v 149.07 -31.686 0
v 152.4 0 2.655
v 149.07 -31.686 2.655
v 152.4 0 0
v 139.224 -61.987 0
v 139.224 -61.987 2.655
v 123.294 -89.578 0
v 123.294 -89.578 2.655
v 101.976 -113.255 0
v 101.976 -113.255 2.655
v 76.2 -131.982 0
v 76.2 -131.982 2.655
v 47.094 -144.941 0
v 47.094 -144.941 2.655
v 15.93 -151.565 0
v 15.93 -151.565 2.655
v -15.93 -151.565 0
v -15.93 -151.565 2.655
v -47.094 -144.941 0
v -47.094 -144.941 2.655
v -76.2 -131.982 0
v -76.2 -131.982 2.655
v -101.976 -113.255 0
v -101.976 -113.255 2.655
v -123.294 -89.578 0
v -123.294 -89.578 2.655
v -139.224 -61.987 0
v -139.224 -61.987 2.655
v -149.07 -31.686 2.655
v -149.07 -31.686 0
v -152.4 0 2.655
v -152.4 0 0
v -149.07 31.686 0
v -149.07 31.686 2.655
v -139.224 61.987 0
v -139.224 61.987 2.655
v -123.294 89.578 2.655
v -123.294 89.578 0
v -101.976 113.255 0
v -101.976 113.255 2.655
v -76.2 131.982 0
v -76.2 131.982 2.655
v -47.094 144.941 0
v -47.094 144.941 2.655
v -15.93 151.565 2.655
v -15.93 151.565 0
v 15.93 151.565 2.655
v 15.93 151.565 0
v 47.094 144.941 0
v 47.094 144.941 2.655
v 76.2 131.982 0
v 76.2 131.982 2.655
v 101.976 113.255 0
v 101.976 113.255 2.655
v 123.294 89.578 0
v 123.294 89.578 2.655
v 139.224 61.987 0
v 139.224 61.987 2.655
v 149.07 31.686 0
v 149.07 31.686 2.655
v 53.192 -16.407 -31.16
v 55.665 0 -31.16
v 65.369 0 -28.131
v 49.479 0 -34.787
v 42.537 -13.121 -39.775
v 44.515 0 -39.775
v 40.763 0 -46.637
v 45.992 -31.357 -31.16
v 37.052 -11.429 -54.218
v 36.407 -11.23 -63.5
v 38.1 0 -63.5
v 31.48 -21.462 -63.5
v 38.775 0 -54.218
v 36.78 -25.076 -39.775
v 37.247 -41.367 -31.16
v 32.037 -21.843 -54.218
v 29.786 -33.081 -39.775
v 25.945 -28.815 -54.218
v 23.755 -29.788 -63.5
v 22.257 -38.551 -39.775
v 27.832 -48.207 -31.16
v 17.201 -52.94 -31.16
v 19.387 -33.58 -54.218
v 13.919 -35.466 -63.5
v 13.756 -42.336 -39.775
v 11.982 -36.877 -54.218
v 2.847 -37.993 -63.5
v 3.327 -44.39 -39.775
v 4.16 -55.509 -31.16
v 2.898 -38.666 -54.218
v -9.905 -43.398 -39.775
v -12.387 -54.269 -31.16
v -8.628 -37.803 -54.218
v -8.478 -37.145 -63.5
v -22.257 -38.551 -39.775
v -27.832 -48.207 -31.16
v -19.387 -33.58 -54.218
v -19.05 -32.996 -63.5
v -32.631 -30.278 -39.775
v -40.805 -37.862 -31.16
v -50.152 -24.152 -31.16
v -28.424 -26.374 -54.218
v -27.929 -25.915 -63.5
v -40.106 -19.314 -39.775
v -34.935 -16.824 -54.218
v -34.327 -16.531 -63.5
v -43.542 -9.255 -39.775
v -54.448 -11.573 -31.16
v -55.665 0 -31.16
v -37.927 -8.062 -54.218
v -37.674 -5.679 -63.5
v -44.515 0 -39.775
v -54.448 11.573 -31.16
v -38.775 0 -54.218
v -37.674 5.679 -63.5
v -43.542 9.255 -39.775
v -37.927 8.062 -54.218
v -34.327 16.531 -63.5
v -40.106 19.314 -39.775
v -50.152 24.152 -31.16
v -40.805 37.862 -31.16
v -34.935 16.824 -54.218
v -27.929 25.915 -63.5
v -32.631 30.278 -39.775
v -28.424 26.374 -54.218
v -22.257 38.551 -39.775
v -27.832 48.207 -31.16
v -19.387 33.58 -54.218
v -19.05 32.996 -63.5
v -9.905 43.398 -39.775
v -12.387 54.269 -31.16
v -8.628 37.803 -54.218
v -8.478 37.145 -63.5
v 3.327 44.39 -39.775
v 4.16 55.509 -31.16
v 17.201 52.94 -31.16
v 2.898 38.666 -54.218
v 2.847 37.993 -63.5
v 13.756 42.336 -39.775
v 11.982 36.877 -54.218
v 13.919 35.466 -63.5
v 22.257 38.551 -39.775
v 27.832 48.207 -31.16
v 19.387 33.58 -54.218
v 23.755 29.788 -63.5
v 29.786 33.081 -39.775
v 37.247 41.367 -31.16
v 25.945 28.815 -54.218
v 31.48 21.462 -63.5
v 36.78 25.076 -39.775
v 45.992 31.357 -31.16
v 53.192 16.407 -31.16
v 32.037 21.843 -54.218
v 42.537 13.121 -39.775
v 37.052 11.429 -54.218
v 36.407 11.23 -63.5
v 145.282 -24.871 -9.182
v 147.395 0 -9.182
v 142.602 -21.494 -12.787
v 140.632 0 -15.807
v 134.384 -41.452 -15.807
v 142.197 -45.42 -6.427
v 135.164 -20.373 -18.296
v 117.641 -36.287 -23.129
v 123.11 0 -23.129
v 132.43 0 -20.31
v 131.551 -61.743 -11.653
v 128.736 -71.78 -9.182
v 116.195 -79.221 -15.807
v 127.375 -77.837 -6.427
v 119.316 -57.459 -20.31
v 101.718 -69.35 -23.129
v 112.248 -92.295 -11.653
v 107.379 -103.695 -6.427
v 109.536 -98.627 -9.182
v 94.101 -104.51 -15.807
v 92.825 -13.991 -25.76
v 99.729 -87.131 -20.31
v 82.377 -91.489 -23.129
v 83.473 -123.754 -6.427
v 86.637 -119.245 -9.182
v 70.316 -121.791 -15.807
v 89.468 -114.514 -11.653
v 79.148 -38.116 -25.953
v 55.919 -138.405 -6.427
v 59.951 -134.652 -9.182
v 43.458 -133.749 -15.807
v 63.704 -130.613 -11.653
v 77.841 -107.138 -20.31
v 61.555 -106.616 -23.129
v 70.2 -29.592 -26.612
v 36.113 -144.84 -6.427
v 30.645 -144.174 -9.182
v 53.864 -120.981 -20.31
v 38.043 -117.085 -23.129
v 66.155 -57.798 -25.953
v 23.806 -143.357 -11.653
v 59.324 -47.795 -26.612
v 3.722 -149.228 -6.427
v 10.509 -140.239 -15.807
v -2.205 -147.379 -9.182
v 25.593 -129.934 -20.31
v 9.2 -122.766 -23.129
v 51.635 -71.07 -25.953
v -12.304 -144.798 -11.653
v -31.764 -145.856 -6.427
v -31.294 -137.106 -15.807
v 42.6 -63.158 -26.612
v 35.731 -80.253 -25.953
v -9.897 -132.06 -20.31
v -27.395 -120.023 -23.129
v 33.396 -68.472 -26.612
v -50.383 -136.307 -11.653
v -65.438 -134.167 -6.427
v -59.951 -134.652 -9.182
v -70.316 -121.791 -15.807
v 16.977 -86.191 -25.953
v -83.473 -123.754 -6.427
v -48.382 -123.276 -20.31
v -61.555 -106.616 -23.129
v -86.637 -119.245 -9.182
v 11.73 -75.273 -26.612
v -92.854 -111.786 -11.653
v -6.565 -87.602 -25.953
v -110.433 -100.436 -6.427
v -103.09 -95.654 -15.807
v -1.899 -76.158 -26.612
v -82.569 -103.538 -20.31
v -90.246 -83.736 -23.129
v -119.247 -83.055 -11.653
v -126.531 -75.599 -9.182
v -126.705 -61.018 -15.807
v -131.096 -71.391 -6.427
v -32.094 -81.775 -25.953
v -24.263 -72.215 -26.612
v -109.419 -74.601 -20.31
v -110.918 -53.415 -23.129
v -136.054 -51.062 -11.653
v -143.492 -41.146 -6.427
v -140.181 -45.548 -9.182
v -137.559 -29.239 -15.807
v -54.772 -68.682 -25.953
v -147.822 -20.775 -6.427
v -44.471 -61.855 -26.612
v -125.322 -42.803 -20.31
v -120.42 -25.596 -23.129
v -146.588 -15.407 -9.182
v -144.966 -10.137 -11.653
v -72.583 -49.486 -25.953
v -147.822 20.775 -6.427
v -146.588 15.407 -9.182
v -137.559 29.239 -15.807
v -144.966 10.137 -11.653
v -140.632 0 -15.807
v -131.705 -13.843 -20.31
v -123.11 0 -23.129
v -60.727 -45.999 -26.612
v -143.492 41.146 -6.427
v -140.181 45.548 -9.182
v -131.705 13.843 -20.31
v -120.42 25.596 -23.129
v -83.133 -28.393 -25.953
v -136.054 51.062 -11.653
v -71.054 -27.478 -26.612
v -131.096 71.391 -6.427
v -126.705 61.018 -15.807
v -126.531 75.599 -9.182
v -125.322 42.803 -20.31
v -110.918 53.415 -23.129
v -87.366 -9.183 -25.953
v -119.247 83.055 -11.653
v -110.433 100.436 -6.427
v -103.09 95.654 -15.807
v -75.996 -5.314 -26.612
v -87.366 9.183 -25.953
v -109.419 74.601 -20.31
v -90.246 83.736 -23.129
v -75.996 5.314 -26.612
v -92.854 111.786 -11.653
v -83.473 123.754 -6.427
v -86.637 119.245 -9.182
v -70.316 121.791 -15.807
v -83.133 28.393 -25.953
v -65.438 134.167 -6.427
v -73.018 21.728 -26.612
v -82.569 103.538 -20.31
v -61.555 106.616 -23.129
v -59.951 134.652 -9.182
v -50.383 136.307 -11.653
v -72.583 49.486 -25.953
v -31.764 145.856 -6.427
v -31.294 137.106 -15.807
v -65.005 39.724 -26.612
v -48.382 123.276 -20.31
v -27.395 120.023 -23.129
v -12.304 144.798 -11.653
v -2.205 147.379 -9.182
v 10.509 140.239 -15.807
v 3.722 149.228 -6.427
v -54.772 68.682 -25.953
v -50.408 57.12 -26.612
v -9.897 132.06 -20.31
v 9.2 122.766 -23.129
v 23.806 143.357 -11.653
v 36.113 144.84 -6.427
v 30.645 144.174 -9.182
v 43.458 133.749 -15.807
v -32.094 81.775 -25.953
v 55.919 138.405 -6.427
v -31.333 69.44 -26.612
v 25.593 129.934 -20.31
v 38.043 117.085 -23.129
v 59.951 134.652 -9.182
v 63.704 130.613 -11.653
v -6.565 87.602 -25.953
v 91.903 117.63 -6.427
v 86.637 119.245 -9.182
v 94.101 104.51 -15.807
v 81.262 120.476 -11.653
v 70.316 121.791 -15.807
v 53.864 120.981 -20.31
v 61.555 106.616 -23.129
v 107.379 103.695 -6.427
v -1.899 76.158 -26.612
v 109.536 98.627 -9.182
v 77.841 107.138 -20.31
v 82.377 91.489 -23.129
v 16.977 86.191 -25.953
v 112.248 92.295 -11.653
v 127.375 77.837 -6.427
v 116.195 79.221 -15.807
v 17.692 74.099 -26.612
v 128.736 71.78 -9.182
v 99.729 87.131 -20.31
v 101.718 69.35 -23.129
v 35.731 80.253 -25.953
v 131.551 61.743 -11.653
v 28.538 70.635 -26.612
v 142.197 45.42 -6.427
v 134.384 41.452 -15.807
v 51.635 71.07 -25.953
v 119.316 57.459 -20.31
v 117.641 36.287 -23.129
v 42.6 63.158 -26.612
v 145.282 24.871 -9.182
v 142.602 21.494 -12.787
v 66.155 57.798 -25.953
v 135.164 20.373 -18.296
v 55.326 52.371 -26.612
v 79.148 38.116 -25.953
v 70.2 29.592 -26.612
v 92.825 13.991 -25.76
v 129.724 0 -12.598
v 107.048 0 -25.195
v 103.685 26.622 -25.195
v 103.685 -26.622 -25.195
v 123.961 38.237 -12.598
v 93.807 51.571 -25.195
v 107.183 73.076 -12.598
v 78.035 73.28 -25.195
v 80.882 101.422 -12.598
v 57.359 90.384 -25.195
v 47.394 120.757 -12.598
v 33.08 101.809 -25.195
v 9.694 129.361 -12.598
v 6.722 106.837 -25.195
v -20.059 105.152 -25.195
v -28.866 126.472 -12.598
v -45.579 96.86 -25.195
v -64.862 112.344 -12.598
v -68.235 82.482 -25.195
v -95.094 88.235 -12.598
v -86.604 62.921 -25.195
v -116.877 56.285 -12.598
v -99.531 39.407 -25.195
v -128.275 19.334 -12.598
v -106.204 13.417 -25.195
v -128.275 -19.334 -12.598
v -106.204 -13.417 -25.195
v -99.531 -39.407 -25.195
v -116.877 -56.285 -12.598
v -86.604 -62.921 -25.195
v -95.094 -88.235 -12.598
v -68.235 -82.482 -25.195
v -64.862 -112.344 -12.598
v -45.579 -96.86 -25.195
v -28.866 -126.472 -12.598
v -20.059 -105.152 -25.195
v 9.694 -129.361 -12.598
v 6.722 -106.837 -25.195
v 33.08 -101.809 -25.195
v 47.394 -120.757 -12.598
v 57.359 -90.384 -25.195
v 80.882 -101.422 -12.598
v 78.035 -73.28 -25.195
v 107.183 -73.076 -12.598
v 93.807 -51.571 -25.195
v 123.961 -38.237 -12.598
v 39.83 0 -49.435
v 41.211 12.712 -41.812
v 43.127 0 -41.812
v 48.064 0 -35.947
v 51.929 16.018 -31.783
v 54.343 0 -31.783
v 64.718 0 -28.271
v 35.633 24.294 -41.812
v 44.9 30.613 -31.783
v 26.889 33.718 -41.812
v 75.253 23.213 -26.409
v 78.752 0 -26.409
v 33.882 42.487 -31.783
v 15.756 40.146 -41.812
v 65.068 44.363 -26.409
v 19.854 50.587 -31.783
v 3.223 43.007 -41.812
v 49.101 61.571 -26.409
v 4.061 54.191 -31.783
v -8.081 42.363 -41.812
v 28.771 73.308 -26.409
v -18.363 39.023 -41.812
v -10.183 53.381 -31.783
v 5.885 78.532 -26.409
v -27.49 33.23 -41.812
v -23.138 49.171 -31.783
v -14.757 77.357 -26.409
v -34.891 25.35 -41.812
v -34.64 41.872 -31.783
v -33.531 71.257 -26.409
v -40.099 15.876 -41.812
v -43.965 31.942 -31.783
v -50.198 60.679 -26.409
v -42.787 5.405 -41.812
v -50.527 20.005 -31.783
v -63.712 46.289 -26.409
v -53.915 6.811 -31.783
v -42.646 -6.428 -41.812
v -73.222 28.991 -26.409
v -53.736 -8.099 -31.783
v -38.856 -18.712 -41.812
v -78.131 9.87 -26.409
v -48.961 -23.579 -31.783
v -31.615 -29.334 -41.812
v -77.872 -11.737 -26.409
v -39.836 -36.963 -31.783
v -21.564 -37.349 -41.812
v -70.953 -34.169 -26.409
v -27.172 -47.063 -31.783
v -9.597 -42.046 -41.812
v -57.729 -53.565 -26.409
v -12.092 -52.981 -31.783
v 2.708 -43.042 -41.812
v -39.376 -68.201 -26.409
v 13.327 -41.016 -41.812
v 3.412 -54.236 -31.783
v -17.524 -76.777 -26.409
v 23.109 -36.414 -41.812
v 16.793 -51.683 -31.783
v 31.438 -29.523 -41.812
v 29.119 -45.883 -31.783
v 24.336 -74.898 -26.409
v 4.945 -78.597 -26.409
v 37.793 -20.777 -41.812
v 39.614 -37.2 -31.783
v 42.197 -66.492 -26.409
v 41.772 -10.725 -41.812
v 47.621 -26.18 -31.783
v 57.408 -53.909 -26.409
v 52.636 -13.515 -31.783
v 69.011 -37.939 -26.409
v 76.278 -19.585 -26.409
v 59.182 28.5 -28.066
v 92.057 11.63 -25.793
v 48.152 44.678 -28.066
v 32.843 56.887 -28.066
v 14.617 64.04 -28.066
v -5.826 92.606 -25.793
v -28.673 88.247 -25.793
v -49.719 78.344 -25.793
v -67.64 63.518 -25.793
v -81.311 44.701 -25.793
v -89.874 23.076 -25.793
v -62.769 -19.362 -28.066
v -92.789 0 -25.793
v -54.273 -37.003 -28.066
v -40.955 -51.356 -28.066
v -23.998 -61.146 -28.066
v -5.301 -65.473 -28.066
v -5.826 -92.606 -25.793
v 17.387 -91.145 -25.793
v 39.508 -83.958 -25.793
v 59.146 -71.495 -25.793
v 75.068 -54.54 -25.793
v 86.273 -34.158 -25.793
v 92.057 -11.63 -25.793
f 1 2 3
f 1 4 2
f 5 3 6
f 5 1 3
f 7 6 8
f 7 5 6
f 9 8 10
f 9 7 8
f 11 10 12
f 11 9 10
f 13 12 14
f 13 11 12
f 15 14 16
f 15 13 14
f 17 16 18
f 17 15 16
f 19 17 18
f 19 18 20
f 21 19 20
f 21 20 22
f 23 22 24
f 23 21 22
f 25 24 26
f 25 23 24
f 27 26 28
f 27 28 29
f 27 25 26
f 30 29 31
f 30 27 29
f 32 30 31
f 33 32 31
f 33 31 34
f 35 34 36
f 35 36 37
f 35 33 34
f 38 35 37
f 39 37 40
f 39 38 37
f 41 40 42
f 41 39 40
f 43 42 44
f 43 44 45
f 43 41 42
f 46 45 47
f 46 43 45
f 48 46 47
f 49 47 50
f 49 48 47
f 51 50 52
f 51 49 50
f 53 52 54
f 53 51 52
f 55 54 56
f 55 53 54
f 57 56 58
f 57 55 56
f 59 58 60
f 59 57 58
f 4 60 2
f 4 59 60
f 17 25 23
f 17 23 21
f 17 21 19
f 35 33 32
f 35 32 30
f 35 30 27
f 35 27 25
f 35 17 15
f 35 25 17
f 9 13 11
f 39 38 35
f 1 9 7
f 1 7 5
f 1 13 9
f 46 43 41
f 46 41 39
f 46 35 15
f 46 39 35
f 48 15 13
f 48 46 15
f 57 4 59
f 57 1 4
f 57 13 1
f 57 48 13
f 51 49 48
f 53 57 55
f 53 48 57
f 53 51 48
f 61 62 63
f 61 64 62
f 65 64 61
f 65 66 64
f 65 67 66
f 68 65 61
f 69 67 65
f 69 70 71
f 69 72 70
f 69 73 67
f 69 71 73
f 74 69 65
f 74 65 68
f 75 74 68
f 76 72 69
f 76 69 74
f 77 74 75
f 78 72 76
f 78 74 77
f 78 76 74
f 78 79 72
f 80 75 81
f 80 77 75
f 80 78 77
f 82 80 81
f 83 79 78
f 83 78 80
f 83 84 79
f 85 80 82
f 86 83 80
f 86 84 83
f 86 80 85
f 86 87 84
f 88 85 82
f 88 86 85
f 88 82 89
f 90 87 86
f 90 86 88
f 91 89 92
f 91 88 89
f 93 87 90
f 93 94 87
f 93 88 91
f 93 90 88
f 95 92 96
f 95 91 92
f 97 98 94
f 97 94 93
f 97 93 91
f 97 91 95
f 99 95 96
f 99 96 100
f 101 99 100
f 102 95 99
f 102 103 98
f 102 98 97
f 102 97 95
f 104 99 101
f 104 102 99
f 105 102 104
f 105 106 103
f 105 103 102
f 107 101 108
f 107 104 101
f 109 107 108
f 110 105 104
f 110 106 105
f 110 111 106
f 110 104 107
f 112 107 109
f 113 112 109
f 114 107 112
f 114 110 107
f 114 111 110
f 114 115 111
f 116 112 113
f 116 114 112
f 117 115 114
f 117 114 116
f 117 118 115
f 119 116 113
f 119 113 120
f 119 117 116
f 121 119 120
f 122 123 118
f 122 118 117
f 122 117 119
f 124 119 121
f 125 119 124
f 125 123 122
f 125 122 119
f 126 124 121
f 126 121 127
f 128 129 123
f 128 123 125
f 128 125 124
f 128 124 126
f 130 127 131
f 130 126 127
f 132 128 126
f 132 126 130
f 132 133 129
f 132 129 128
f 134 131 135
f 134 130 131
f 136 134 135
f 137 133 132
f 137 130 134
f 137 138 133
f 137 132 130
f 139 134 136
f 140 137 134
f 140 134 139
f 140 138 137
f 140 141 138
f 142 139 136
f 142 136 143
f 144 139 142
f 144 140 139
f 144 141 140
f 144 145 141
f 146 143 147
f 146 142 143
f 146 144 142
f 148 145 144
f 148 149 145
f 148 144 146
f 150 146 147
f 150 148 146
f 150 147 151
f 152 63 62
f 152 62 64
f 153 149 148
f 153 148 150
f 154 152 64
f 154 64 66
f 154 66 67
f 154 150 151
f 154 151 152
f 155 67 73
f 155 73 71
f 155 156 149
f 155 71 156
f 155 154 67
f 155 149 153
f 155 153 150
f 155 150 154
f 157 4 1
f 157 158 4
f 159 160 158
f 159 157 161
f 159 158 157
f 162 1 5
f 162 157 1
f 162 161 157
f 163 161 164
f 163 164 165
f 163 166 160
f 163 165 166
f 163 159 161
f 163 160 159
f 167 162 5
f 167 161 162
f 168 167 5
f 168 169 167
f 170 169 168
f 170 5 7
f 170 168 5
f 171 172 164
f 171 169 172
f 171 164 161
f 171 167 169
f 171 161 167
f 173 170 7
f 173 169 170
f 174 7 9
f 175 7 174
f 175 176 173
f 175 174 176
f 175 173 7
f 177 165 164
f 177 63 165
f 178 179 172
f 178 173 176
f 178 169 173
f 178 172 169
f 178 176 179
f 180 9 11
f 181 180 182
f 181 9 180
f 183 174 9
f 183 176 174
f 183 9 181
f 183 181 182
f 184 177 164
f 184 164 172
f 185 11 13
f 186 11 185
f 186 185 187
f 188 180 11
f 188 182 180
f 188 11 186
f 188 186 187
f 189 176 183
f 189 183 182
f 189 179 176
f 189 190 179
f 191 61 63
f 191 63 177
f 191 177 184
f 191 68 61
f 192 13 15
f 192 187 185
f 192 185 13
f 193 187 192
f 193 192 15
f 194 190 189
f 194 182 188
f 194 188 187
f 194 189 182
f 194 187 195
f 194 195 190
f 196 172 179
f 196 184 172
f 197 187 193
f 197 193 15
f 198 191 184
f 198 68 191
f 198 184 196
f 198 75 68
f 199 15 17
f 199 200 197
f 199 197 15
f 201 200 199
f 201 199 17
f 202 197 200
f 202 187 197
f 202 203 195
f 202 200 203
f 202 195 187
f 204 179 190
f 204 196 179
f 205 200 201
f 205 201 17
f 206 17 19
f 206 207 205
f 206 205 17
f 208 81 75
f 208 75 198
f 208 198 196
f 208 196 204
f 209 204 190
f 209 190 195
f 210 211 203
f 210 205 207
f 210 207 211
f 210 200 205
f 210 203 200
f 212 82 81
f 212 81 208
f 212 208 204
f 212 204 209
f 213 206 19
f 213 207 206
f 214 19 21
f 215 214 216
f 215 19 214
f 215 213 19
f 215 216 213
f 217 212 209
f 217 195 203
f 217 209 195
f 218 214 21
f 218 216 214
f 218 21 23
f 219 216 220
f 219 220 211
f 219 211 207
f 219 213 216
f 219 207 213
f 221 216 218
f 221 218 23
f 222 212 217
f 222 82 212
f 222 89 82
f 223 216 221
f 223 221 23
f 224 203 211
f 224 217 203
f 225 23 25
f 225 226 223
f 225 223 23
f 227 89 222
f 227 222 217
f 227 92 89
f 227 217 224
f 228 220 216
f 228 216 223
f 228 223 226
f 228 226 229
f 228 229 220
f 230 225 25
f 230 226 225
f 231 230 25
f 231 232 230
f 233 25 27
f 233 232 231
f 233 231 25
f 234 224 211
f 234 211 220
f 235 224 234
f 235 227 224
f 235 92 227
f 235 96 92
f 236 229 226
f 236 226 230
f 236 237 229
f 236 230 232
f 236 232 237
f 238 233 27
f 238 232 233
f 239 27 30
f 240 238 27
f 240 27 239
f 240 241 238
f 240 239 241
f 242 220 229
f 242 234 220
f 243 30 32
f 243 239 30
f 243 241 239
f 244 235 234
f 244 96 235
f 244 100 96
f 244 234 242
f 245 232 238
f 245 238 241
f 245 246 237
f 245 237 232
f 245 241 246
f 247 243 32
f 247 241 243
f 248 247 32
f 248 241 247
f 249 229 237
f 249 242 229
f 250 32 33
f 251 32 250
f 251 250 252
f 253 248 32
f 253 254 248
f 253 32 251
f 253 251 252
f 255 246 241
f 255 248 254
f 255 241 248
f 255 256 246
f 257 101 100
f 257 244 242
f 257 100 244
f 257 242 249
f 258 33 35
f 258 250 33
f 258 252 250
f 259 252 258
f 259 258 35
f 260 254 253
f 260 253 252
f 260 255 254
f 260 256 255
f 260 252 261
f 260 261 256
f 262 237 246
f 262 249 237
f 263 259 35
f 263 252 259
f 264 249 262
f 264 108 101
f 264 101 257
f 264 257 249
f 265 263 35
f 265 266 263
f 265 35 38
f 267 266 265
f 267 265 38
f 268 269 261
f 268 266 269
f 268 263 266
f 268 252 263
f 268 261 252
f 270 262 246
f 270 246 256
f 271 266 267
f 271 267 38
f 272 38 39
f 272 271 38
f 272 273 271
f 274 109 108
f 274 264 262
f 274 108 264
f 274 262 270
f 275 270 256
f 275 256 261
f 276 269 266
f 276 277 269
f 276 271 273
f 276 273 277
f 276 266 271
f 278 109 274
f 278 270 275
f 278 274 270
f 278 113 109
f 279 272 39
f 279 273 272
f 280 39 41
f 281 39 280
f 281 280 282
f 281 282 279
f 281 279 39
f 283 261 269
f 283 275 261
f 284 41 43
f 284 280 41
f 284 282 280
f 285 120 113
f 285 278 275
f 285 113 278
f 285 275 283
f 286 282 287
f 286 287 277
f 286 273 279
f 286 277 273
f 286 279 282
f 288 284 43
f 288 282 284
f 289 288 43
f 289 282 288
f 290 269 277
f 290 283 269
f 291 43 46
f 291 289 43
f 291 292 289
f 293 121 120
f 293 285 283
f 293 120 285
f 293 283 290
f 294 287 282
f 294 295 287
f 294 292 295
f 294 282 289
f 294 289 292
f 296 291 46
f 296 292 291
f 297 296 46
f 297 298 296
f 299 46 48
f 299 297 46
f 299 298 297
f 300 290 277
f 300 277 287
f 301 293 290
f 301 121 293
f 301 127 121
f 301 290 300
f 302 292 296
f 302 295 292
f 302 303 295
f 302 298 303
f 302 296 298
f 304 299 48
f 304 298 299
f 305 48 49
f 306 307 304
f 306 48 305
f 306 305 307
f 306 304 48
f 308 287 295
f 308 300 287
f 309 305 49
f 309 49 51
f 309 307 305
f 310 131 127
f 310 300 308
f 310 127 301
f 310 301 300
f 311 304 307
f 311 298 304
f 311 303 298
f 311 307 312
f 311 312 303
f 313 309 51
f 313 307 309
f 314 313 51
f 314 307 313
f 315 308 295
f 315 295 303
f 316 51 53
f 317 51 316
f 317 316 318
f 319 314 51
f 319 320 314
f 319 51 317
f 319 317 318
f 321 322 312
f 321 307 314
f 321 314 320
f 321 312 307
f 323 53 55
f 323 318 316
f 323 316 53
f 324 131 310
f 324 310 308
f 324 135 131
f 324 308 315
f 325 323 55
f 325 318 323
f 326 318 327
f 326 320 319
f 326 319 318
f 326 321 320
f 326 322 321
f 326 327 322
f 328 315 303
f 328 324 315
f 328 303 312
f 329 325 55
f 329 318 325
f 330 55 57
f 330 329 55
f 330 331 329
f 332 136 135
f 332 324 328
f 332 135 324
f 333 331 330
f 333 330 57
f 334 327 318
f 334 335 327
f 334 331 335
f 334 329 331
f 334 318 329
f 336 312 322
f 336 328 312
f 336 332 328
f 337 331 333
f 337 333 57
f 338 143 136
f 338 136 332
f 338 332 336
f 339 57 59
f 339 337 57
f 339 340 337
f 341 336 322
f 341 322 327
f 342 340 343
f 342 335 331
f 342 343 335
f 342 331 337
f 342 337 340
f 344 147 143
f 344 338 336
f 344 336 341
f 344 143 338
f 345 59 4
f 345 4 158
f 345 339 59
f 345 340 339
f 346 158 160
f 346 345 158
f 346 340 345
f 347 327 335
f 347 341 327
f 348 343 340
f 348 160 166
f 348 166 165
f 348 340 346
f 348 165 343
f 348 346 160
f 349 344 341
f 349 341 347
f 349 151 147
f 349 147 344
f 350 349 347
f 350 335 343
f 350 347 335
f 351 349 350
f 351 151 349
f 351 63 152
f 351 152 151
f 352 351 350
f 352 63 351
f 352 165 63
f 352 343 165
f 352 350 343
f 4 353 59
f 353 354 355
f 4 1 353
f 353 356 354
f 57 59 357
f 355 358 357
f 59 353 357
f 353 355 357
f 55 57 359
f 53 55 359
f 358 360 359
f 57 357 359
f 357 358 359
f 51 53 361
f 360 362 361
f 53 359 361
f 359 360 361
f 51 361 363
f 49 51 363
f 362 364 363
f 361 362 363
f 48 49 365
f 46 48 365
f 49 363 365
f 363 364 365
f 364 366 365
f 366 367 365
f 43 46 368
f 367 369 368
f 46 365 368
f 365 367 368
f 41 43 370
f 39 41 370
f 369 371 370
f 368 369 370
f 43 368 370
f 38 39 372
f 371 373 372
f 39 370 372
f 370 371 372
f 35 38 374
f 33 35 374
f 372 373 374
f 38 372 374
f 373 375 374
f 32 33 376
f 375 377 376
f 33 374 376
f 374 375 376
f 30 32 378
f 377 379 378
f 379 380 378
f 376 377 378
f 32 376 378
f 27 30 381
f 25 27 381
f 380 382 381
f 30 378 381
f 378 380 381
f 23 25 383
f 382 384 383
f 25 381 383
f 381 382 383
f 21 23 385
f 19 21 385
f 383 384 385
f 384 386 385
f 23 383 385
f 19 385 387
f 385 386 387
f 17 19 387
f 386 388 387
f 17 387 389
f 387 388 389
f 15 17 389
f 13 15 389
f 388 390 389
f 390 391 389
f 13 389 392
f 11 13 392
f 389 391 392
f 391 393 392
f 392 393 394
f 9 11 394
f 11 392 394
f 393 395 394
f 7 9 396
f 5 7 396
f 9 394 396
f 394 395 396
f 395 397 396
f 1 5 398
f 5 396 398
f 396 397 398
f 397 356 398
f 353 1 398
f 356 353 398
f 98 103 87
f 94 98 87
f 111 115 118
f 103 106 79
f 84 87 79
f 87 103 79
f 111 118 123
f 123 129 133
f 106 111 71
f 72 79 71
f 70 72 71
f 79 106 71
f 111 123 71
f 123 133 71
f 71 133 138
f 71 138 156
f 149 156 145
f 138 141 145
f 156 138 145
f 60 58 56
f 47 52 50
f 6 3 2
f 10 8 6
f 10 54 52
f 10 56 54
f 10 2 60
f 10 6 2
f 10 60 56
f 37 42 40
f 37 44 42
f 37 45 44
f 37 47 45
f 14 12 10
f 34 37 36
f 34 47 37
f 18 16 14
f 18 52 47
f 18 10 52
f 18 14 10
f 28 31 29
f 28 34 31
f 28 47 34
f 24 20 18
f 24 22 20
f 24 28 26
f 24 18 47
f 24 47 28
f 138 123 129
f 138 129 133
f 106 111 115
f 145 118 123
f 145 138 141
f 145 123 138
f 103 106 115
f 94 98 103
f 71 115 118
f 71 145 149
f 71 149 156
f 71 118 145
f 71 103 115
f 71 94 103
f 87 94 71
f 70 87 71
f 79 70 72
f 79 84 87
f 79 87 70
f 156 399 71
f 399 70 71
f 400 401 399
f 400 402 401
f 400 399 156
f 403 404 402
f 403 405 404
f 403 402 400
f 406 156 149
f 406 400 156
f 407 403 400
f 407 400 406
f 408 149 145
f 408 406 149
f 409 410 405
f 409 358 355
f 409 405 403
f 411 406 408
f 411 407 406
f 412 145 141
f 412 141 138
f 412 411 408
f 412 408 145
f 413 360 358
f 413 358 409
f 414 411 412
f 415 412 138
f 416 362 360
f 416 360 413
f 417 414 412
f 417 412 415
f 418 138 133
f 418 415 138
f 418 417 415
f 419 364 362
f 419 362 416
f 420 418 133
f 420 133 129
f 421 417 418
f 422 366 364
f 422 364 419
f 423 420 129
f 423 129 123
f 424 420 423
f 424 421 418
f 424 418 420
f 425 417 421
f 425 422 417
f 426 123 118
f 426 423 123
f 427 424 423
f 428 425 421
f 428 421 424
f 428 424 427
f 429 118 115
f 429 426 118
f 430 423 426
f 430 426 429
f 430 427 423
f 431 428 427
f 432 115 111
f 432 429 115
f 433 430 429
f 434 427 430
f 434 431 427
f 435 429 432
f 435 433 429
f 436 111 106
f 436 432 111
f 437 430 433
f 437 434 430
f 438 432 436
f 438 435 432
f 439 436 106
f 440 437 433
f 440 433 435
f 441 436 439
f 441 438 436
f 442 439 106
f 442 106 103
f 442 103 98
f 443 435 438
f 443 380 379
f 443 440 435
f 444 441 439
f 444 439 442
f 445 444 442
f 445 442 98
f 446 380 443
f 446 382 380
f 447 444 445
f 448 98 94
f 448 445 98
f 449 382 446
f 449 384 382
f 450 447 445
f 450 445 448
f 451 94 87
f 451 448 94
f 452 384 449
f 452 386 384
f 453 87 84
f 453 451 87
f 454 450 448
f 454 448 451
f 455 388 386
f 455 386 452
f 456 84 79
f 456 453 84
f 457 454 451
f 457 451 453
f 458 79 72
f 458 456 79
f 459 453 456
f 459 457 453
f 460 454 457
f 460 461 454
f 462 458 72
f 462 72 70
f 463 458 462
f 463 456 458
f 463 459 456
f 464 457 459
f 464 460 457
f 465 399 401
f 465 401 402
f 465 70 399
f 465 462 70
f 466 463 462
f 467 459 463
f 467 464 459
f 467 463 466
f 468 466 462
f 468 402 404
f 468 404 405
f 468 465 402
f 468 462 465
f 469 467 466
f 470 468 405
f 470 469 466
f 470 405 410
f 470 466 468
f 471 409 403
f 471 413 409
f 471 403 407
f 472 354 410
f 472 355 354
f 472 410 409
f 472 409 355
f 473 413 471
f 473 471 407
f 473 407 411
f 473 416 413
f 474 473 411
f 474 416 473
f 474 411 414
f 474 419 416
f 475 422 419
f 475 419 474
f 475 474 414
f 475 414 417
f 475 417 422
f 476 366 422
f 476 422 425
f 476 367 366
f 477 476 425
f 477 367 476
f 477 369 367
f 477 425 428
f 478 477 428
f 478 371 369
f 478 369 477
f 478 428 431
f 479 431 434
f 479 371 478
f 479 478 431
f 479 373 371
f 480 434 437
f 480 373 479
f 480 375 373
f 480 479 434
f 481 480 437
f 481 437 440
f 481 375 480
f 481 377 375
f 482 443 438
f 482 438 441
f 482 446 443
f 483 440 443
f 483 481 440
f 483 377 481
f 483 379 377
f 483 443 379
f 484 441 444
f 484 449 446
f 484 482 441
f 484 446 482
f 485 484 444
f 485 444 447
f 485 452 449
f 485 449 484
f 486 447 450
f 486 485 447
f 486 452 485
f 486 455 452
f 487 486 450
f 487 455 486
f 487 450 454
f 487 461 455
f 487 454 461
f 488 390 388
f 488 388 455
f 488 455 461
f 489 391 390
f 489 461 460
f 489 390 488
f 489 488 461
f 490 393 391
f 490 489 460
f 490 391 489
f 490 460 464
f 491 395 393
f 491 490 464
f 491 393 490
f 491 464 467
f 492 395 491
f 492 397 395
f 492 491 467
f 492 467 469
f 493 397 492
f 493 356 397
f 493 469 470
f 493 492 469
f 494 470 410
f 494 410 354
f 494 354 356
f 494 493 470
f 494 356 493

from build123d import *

# Parameters (mm, degrees)
SKETCH1_R = 152.4
SKETCH2_R = 38.1


# Read off the part's stored shape, not the designer's step: Cut-Revolve2
with BuildPart() as part:
    # Sketch1 → Loft2 section 0
    with BuildSketch(Plane.XY):
        Circle(SKETCH1_R)
    # Sketch2 → Loft2 section 1
    with BuildSketch(Plane.XY.offset(-63.5)):
        Circle(SKETCH2_R)
    loft()

    # Cut-Revolve2 outline → Cut-Revolve2 (revolve, cut)
    with BuildSketch(Plane.XZ):
        with BuildLine():
            add(Edge.make_bspline(
                [(38.1, -63.5), (37.997026849, -21.52773095), (74.60779797, -27.328601895), (107.048176751, -25.195457361)],
                knots=[0, 0, 0, 0, 0.621948939, 0.621948939, 0.621948939, 0.621948939], degree=3))
            Line((38.1, -63.5), (107.048176851, -63.5000001))
            Line((107.048176851, -63.5000001), (107.048176751, -25.195457361))
        make_face()
    revolve(axis=Axis((0, 0, 0), (0, 0, 1)), mode=Mode.SUBTRACT)


with BuildPart() as body_2:
    # Sketch8 → Revolve1 (revolve)
    with BuildSketch(Plane(origin=(0, 0, 0), x_dir=(1, 0, 0), z_dir=(0, 1, 0)), mode=Mode.PRIVATE) as revolve1_sk:
        with BuildLine():
            Line((-38.1, 63.5), (0, 63.5))
            Line((0, 63.5), (0, -2.655267609))
            Line((0, -2.655267609), (-152.4, -2.655267609))
            Line((-152.4, -2.655267609), (-152.4, 0))
            add(Edge.make_bspline(
                [(-152.4, 0), (-132.680452173, 52.031950549), (-37.93443472, -3.985072174), (-38.1, 63.5)],
                knots=[0, 0, 0, 0, 1, 1, 1, 1], degree=3))
        make_face()
    revolve(revolve1_sk.sketch.rotate(Axis((0, 0, 0), (0, 0, -1)), 180), axis=Axis((0, 0, 0), (0, 0, -1)))


solid = Compound([part.part, body_2.part])
